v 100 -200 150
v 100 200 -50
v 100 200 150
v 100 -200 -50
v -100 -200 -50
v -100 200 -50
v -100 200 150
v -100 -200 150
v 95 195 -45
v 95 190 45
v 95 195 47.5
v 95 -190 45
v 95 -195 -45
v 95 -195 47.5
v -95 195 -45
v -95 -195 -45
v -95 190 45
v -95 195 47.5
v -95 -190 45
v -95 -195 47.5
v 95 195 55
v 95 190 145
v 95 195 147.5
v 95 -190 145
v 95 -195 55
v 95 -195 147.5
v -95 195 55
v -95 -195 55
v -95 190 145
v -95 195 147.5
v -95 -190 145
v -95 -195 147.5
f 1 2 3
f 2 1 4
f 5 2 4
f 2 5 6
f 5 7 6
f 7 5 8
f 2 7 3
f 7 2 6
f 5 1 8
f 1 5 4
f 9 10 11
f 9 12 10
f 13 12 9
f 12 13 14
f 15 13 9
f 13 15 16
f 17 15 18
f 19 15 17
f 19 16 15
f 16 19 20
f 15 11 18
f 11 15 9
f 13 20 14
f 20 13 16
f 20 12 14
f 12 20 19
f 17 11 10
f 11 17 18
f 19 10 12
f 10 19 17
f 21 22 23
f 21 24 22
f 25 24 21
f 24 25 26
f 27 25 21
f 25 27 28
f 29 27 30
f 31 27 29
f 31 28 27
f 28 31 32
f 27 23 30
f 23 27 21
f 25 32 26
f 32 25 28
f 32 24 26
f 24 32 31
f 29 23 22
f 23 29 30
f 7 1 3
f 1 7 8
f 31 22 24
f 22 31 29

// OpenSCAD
// George Onoufriou <GeorgeRaven> bento.scad
bentoBox();

module bentoBox(){
    // customise
    height =    100;
    length =    400;
    width =     200;
    thickness = 5;
    tolerance = 1;
    center =    true;

    midBox(width, length, height, thickness, center);
    boxBase(width, length, height, thickness, center);
    translate([0,0,height]){
      baseLid(width, length, height, thickness, center);
    }
};

module midBox(width, length, height, thickness, center){
  union(){
    translate([0,0,height]){
      boxBase(width, length, height, thickness, center);
    }
    baseLid(width, length, height, thickness, center);
  }
}

module boxBase(width, length, height, thickness, center){
  difference(){
    slantOpenCube(width, length, height, thickness, center);
    baseLid(width, length, height, thickness, center);
  }
}

module baseLid(width, length, height, thickness, center){
  difference(){
    rotate([0,180,0]){
      squarePyramid(width, length, height, center);
    }
    translate([0,0,-thickness]){
      cube([width, length, height], center);
    }
  }

}

module squarePyramid(w, l, h, center) {
    offset = [0,0,0];
    offset = [-w/2,-l/2,-h/2];
    if(center == true){
        offset = [w/2,l/2,h/2];
    }

    translate(offset){
        mw = w/2;
        ml = l/2;
        polyhedron(points = [
            [0,  0,  0],
            [w,  0,  0],
            [0,  l,  0],
            [w,  l,  0],
            [mw, ml, h]
        ], faces = [
            [4, 1, 0],
            [4, 3, 1],
            [4, 2, 3],
            [4, 0, 2],
            //base
            [0, 1, 2],
            [2, 1, 3]
            ]);
    }
}

// module which generates a one side open using a slanted cut, hollow cube/ rectangle
module slantOpenCube(width, length, height, thickness, center){
    if(center == true){
        difference(){
            hollowCube(width, length, height, thickness, center);
            translate([0,0,(height/2)-(thickness/2)]){
                cube([width-(thickness*2), length-(thickness*2), thickness+0.01], center);
            };
        }
    }
    else{
        difference(){
            hollowCube(width, length, height, thickness, center);
            translate([thickness, thickness, (height-thickness)]){
                cube([width-(thickness*2), length-(thickness*2), thickness+0.01], center);
            };
        }
    }
}

// module which generates a one side open hollow cube/ rectangle
module openCube(width, length, height, thickness, center){
    if(center == true){
        difference(){
            hollowCube(width, length, height, thickness, center);
            translate([0,0,(height/2)-(thickness/2)]){
                cube([width-(thickness*2), length-(thickness*2), thickness+0.01], center);
            };
        }
    }
    else{
        difference(){
            hollowCube(width, length, height, thickness, center);
            translate([thickness, thickness, (height-thickness)]){
                cube([width-(thickness*2), length-(thickness*2), thickness+0.01], center);
            };
        }
    }
}

// module which generates a hollow cube/ rectangle
module hollowCube(width, length, height, thickness, center){
    if(center == true){
        difference(){
            cube([width, length, height], center);
            cube([width-(thickness*2), length-(thickness*2), height-(thickness*2)], center);
        };
    }
    else{
        difference(){
            cube([width, length, height], center);
            translate([thickness, thickness, thickness]){
                cube([width-(thickness*2), length-(thickness*2), height-(thickness*2)], center);
            }
        };
    };
};
